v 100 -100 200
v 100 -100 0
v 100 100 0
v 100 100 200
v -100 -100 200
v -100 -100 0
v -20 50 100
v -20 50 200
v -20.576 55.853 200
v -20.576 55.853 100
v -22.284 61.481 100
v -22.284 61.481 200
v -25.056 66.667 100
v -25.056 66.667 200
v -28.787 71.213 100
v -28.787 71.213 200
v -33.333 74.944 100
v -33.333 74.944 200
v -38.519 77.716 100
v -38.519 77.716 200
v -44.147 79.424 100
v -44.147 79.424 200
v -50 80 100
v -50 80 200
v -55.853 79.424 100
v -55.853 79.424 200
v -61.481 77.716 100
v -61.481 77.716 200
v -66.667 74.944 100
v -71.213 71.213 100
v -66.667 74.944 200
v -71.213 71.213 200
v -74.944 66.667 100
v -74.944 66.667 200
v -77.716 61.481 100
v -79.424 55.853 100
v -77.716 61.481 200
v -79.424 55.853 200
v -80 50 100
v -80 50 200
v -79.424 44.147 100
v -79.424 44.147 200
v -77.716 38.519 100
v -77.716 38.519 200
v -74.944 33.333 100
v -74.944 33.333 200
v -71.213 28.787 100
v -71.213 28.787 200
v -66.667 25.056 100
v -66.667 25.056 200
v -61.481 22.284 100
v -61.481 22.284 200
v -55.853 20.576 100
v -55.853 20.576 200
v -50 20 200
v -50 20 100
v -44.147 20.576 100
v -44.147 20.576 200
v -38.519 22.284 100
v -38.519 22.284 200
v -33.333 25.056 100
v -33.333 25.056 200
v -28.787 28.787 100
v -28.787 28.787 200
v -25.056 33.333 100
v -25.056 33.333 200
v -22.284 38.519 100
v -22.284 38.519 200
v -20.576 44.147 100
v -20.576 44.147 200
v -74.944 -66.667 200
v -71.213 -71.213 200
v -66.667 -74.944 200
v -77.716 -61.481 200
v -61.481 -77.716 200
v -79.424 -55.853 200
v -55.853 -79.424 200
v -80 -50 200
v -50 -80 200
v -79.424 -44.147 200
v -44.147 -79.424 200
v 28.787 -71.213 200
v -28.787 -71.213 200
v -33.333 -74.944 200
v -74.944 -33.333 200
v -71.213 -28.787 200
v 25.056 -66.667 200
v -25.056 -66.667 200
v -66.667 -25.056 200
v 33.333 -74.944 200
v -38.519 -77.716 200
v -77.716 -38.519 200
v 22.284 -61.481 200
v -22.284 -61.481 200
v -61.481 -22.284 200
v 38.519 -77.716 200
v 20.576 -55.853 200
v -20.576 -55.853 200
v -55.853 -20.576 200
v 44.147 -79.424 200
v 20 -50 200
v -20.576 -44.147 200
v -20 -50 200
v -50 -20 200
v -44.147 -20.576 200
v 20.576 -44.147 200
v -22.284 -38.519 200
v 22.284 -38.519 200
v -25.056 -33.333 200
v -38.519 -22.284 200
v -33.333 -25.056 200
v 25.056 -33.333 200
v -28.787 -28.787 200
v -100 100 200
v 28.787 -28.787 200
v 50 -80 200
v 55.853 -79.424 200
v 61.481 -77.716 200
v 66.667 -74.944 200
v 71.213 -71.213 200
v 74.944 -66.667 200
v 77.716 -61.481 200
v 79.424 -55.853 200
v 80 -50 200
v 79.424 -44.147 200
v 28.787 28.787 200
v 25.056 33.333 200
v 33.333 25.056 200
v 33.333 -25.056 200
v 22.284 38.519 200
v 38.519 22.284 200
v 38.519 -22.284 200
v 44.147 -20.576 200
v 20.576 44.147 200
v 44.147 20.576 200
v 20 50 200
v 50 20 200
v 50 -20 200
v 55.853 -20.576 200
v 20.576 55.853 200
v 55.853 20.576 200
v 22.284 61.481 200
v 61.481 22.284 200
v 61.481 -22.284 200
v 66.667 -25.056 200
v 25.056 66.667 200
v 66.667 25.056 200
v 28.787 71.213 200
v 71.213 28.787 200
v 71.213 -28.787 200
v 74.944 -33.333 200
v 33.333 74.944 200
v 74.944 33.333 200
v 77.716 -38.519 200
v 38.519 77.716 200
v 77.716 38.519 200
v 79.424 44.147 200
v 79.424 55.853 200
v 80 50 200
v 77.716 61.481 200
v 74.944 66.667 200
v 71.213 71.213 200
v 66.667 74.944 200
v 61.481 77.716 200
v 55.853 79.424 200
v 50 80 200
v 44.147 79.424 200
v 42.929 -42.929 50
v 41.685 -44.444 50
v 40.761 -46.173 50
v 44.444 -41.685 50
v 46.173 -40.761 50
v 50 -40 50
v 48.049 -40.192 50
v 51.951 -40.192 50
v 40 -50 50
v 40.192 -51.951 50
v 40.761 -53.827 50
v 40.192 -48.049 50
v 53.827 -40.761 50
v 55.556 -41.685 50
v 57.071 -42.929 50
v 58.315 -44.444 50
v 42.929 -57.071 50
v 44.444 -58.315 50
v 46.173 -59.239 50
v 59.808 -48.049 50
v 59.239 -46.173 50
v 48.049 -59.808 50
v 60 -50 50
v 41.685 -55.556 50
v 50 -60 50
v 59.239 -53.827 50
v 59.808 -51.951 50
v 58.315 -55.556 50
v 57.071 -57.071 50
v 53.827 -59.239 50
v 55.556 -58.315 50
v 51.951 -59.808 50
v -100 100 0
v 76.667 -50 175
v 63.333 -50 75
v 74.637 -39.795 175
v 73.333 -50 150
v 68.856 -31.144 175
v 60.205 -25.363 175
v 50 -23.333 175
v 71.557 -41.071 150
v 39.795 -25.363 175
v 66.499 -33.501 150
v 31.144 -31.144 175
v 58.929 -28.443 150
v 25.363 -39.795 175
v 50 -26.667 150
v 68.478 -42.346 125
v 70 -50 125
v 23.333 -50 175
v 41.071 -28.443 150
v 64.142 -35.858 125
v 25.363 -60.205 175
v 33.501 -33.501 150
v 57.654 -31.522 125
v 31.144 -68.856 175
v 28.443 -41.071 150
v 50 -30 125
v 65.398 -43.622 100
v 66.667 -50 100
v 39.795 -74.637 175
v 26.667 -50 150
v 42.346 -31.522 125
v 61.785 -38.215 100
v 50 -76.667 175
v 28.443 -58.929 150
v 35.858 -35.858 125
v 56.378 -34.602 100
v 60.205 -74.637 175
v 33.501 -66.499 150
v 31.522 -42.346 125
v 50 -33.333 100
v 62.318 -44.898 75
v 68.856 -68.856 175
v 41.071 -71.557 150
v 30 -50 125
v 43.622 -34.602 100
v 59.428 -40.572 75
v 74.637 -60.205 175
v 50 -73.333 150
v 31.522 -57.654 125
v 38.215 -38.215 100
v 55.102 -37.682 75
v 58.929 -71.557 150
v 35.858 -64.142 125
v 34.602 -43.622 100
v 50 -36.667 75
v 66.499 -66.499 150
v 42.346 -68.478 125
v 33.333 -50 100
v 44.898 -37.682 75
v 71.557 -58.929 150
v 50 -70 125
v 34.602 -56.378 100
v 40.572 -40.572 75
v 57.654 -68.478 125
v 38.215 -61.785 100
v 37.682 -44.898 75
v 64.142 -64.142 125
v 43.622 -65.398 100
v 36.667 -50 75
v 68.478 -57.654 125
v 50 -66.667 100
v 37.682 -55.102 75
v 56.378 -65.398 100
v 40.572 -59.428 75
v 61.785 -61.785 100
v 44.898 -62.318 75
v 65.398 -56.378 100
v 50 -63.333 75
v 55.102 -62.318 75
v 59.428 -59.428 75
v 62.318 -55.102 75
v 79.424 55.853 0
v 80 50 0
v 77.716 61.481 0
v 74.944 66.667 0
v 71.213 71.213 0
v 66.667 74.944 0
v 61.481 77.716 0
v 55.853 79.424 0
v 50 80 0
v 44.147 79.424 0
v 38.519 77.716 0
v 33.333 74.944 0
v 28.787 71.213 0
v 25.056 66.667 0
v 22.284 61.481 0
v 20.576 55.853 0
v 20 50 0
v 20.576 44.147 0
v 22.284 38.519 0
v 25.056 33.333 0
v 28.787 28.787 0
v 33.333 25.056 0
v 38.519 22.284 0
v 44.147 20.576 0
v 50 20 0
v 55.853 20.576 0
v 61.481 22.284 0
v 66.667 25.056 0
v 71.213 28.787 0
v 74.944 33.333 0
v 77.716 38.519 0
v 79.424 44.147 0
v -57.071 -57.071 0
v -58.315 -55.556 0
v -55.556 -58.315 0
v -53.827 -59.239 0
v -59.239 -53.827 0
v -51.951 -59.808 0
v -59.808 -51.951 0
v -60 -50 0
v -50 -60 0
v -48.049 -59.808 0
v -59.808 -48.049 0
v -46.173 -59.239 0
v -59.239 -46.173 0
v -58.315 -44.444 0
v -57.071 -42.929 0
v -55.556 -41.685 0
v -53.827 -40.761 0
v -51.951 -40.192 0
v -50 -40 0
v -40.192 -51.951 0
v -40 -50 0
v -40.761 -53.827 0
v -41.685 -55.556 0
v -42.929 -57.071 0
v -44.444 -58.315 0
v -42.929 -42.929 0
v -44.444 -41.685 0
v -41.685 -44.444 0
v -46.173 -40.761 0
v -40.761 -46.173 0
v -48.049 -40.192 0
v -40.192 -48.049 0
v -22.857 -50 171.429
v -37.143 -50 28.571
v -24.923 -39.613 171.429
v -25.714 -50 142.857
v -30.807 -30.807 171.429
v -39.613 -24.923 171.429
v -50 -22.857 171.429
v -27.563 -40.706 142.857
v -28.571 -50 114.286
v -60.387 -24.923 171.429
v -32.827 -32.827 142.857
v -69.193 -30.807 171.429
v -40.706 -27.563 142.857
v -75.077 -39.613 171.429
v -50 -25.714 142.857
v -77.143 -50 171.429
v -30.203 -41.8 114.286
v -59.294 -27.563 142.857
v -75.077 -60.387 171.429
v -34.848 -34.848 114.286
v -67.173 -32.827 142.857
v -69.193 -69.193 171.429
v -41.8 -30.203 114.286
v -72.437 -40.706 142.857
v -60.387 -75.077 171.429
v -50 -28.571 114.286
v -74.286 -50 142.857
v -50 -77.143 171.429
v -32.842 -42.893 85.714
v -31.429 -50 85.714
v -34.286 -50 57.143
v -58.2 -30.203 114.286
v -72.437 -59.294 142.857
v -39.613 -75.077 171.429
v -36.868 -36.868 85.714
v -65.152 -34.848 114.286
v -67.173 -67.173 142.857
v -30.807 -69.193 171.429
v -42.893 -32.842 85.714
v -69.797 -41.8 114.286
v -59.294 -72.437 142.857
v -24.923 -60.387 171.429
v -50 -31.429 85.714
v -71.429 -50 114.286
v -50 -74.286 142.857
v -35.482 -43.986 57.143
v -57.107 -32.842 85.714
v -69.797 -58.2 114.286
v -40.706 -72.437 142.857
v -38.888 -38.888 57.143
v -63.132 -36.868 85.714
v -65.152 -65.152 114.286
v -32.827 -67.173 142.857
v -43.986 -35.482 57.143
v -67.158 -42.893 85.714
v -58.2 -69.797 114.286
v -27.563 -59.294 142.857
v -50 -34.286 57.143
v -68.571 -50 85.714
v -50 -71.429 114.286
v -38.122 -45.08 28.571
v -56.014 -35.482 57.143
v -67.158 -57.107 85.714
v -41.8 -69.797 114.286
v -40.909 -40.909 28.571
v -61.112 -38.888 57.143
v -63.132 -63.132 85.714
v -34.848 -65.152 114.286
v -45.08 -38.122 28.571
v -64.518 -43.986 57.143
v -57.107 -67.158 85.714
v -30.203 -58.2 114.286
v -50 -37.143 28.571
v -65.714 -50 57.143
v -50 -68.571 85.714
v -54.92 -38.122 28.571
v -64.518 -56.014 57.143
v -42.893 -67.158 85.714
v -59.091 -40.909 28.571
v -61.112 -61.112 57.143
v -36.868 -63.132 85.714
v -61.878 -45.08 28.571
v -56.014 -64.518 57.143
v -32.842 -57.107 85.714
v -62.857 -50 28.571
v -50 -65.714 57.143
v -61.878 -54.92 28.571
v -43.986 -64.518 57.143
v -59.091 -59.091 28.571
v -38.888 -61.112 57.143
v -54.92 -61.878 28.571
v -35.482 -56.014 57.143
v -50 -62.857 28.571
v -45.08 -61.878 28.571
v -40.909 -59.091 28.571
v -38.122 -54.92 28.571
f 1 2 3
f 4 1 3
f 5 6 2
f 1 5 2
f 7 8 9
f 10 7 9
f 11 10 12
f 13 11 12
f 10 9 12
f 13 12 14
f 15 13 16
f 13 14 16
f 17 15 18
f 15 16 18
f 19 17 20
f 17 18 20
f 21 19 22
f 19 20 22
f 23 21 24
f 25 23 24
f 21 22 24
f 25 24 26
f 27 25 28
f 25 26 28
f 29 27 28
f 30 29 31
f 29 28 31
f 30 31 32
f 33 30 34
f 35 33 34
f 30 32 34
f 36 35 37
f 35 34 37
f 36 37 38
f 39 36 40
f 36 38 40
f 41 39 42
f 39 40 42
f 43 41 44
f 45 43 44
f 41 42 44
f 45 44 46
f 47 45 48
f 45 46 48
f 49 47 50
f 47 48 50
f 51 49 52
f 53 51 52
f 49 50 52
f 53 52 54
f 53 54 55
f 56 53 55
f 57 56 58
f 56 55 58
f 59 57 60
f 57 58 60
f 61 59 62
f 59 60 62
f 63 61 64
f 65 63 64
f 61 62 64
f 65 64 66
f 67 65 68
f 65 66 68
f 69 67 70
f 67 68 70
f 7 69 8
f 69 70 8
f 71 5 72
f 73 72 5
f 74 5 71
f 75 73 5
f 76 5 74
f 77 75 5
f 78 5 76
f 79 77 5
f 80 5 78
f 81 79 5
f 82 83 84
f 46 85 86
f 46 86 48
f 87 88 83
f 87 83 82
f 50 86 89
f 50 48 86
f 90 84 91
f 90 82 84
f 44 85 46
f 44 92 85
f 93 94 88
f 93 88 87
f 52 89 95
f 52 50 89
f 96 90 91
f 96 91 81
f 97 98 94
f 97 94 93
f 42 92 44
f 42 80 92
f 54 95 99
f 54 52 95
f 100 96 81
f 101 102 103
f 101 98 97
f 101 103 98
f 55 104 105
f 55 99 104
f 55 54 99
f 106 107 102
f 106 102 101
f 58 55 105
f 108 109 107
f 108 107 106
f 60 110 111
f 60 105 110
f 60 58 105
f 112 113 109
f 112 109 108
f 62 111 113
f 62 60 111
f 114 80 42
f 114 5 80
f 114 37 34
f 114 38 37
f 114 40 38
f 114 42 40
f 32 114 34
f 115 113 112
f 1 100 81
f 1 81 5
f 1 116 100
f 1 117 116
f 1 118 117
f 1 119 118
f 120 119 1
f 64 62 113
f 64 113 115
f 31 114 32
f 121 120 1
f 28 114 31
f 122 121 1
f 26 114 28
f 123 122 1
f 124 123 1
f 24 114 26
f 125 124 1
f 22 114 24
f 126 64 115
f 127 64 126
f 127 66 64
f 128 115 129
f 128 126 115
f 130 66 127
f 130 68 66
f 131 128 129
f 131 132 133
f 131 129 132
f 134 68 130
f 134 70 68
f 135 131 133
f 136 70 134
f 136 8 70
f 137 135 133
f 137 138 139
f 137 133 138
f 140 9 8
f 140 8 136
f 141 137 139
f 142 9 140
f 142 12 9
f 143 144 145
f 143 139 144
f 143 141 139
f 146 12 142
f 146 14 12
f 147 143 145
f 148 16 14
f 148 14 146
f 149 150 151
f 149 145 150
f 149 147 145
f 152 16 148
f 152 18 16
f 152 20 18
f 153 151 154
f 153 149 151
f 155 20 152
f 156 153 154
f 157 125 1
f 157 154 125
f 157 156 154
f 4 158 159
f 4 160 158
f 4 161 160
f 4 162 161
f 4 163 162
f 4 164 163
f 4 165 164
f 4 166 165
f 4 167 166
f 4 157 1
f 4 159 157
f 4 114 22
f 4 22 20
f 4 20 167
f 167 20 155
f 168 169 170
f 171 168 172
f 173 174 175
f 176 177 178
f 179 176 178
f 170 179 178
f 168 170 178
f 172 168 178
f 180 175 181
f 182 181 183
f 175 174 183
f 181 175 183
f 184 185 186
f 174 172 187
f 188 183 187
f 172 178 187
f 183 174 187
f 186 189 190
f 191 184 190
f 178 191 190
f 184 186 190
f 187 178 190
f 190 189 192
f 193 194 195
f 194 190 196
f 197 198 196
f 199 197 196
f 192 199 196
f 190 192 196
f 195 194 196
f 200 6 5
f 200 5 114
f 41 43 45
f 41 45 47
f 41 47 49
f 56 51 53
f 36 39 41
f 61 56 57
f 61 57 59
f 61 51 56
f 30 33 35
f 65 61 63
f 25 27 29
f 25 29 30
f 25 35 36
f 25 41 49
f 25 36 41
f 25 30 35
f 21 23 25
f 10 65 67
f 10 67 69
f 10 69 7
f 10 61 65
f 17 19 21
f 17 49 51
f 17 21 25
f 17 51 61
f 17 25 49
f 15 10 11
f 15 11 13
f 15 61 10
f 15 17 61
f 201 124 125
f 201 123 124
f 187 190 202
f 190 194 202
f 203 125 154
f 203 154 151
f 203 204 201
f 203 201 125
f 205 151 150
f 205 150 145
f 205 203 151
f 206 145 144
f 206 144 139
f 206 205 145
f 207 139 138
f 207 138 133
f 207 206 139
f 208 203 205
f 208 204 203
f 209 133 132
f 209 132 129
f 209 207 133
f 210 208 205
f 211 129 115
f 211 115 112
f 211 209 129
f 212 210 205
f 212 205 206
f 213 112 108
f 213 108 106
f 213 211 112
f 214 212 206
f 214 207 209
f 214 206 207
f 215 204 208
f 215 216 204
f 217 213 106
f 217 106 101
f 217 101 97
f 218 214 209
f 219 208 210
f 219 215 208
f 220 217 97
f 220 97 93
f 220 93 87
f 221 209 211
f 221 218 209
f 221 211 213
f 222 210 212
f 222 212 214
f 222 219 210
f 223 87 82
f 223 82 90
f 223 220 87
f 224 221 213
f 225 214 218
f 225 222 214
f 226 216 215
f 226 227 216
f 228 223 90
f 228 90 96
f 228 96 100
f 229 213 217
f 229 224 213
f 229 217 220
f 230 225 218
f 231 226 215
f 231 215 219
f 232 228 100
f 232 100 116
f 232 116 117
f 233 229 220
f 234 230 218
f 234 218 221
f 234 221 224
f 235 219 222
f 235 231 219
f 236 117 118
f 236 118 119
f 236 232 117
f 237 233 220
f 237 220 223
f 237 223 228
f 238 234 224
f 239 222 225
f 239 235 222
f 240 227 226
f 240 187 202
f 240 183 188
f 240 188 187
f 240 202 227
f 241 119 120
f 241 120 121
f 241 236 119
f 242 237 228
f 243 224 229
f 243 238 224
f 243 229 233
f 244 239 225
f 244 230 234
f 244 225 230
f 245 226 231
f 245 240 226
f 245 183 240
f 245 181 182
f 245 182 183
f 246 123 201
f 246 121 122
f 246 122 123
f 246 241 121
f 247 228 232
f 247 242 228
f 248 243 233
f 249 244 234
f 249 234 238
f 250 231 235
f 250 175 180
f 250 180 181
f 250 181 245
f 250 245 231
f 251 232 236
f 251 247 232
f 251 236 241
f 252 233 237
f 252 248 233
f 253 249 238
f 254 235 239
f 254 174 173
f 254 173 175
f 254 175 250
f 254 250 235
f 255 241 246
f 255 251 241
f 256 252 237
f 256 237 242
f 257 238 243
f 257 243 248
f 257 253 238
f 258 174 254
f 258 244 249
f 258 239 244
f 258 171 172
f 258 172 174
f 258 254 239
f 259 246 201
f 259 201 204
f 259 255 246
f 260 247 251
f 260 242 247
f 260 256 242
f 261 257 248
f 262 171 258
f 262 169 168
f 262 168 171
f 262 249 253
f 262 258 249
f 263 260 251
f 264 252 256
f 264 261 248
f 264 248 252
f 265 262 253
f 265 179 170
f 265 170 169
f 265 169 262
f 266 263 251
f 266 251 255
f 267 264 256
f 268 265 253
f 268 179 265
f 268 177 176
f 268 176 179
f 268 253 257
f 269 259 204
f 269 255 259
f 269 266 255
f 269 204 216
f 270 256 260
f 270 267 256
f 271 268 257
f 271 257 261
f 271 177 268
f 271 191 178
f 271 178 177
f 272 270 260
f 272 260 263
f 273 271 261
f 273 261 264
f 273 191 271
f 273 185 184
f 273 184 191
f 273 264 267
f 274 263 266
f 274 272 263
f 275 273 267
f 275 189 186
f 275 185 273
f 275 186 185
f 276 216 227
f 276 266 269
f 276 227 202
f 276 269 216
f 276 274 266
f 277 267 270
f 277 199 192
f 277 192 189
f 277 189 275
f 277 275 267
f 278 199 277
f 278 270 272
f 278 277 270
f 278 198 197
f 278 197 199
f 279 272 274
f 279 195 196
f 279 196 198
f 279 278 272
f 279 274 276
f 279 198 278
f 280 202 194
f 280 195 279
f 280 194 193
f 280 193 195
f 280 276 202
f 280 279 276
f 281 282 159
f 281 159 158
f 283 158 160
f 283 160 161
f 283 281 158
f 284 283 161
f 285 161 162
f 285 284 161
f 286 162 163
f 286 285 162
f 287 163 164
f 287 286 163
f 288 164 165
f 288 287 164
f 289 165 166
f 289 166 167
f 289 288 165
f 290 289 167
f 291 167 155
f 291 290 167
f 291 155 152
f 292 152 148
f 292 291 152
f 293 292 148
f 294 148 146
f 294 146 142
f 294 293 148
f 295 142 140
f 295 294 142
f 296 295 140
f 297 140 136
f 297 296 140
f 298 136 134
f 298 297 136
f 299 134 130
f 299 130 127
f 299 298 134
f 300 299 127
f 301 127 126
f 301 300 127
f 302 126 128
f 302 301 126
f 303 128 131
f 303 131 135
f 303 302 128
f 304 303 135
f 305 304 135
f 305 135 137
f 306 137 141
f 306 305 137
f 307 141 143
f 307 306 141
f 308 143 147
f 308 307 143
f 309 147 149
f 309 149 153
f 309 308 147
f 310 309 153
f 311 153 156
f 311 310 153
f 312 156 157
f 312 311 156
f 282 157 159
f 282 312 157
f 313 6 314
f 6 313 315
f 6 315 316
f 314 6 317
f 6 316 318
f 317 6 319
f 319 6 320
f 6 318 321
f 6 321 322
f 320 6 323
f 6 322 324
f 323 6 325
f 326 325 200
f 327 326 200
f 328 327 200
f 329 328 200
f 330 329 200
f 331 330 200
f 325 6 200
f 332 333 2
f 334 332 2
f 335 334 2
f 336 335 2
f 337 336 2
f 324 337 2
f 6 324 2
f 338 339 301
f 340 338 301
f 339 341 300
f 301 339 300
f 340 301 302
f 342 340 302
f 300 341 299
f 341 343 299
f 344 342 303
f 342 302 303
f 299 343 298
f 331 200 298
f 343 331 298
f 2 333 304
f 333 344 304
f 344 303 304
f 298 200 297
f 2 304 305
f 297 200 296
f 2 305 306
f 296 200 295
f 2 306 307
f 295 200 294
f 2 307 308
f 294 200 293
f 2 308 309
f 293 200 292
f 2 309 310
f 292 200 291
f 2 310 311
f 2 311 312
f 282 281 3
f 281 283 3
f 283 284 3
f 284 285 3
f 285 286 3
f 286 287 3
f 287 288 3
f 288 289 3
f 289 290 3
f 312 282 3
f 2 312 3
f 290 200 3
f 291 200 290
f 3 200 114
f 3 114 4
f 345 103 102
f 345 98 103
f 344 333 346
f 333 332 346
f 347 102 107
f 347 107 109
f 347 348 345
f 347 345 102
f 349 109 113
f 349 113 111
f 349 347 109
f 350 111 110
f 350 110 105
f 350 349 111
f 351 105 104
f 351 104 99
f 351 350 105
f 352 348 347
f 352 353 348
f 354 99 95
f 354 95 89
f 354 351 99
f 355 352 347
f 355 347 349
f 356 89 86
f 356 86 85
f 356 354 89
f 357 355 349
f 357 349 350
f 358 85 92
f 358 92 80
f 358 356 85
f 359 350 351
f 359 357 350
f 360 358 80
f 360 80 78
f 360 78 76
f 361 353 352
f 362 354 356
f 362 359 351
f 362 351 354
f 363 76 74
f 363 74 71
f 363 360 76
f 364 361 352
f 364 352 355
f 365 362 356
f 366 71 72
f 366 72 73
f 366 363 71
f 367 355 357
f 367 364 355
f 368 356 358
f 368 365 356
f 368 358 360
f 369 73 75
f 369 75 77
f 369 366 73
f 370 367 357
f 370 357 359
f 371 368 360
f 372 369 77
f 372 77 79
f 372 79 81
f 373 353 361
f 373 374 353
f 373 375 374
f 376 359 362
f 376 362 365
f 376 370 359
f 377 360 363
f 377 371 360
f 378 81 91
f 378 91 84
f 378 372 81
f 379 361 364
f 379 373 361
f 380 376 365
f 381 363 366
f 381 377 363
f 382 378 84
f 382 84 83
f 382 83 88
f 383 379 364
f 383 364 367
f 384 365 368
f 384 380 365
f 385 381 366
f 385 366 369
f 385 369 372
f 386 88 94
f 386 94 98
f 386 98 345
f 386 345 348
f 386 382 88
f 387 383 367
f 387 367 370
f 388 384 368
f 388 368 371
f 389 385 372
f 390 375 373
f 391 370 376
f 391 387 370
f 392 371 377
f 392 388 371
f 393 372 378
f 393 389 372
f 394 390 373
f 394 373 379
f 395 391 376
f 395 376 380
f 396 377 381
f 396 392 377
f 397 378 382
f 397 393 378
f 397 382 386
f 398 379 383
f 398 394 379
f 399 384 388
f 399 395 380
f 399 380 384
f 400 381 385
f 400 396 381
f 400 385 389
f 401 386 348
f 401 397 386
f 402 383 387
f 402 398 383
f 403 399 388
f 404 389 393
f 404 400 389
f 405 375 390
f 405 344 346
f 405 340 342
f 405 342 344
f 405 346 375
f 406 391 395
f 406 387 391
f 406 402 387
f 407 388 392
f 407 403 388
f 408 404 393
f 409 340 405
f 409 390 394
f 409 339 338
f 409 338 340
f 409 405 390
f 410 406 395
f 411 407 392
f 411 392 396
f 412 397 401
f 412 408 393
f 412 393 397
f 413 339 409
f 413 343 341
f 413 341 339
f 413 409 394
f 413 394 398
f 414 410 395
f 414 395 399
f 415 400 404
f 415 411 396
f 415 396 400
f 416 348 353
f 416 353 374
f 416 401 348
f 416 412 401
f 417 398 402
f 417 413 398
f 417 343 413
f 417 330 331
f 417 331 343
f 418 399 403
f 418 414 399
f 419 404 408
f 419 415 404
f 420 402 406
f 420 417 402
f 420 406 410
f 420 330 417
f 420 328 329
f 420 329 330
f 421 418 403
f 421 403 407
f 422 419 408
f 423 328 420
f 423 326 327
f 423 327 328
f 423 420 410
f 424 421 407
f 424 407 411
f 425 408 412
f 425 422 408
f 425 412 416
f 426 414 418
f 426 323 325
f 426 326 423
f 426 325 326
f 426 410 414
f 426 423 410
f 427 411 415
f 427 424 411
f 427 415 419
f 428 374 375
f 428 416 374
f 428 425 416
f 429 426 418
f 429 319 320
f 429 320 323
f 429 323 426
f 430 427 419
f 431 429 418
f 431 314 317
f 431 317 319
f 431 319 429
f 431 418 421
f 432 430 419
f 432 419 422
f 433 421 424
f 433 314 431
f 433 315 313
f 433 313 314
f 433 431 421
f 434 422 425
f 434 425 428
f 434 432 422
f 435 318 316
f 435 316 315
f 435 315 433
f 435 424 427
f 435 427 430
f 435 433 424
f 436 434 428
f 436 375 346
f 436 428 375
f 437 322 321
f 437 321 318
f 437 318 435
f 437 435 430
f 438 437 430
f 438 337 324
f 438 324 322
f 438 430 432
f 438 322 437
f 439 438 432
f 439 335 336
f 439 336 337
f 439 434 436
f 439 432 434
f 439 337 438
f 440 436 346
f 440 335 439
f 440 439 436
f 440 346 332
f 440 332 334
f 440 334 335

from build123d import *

# Parameters (mm, degrees)
SKETCH_W     = 200
SKETCH_H     = 200
SKETCH_R     = 30
PAD_DEPTH    = 200
SKETCH001_R  = 30
POCKET_DEPTH = 100
SKETCH002_R  = 30
SKETCH003_R  = 10
SKETCH004_R  = 30
SKETCH005_R  = 10


with BuildPart() as part:
    # Sketch → Pad (new body)
    with BuildSketch(Plane.XY):
        Rectangle(SKETCH_W, SKETCH_H)
        with Locations((50, 50)):
            Circle(SKETCH_R, mode=Mode.SUBTRACT)
    extrude(amount=PAD_DEPTH)

    # Sketch001 (on Face7 of Pad) → Pocket (cut)
    with BuildSketch(Plane.XY.offset(200)):
        with Locations((-50, 50)):
            Circle(SKETCH001_R)
    extrude(amount=-POCKET_DEPTH, mode=Mode.SUBTRACT)

    # Sketch002 (on Face5 of Pocket) → SubtractiveLoft section 0
    with BuildSketch(Plane.XY.offset(200)):
        with Locations((-50, -50)):
            Circle(SKETCH002_R)
    # Sketch003 (on Face4 of Pocket) → SubtractiveLoft section 1
    with BuildSketch(Plane(origin=(0, 0, 0), x_dir=(1, 0, 0), z_dir=(0, 0, -1))):
        with Locations((-50, 50)):
            Circle(SKETCH003_R)
    loft(mode=Mode.SUBTRACT)

    # Sketch004 (on Face5 of SubtractiveLoft) → SubtractiveLoft001 section 0
    with BuildSketch(Plane.XY.offset(200)):
        with Locations((50, -50)):
            Circle(SKETCH004_R)
    # Sketch005 (on Face4 of SubtractiveLoft) → SubtractiveLoft001 section 1
    with BuildSketch(Plane(origin=(0, 0, 50), x_dir=(1, 0, 0), z_dir=(0, 0, -1))):
        with Locations((50, 50)):
            Circle(SKETCH005_R)
    loft(mode=Mode.SUBTRACT)


solid = part.part
